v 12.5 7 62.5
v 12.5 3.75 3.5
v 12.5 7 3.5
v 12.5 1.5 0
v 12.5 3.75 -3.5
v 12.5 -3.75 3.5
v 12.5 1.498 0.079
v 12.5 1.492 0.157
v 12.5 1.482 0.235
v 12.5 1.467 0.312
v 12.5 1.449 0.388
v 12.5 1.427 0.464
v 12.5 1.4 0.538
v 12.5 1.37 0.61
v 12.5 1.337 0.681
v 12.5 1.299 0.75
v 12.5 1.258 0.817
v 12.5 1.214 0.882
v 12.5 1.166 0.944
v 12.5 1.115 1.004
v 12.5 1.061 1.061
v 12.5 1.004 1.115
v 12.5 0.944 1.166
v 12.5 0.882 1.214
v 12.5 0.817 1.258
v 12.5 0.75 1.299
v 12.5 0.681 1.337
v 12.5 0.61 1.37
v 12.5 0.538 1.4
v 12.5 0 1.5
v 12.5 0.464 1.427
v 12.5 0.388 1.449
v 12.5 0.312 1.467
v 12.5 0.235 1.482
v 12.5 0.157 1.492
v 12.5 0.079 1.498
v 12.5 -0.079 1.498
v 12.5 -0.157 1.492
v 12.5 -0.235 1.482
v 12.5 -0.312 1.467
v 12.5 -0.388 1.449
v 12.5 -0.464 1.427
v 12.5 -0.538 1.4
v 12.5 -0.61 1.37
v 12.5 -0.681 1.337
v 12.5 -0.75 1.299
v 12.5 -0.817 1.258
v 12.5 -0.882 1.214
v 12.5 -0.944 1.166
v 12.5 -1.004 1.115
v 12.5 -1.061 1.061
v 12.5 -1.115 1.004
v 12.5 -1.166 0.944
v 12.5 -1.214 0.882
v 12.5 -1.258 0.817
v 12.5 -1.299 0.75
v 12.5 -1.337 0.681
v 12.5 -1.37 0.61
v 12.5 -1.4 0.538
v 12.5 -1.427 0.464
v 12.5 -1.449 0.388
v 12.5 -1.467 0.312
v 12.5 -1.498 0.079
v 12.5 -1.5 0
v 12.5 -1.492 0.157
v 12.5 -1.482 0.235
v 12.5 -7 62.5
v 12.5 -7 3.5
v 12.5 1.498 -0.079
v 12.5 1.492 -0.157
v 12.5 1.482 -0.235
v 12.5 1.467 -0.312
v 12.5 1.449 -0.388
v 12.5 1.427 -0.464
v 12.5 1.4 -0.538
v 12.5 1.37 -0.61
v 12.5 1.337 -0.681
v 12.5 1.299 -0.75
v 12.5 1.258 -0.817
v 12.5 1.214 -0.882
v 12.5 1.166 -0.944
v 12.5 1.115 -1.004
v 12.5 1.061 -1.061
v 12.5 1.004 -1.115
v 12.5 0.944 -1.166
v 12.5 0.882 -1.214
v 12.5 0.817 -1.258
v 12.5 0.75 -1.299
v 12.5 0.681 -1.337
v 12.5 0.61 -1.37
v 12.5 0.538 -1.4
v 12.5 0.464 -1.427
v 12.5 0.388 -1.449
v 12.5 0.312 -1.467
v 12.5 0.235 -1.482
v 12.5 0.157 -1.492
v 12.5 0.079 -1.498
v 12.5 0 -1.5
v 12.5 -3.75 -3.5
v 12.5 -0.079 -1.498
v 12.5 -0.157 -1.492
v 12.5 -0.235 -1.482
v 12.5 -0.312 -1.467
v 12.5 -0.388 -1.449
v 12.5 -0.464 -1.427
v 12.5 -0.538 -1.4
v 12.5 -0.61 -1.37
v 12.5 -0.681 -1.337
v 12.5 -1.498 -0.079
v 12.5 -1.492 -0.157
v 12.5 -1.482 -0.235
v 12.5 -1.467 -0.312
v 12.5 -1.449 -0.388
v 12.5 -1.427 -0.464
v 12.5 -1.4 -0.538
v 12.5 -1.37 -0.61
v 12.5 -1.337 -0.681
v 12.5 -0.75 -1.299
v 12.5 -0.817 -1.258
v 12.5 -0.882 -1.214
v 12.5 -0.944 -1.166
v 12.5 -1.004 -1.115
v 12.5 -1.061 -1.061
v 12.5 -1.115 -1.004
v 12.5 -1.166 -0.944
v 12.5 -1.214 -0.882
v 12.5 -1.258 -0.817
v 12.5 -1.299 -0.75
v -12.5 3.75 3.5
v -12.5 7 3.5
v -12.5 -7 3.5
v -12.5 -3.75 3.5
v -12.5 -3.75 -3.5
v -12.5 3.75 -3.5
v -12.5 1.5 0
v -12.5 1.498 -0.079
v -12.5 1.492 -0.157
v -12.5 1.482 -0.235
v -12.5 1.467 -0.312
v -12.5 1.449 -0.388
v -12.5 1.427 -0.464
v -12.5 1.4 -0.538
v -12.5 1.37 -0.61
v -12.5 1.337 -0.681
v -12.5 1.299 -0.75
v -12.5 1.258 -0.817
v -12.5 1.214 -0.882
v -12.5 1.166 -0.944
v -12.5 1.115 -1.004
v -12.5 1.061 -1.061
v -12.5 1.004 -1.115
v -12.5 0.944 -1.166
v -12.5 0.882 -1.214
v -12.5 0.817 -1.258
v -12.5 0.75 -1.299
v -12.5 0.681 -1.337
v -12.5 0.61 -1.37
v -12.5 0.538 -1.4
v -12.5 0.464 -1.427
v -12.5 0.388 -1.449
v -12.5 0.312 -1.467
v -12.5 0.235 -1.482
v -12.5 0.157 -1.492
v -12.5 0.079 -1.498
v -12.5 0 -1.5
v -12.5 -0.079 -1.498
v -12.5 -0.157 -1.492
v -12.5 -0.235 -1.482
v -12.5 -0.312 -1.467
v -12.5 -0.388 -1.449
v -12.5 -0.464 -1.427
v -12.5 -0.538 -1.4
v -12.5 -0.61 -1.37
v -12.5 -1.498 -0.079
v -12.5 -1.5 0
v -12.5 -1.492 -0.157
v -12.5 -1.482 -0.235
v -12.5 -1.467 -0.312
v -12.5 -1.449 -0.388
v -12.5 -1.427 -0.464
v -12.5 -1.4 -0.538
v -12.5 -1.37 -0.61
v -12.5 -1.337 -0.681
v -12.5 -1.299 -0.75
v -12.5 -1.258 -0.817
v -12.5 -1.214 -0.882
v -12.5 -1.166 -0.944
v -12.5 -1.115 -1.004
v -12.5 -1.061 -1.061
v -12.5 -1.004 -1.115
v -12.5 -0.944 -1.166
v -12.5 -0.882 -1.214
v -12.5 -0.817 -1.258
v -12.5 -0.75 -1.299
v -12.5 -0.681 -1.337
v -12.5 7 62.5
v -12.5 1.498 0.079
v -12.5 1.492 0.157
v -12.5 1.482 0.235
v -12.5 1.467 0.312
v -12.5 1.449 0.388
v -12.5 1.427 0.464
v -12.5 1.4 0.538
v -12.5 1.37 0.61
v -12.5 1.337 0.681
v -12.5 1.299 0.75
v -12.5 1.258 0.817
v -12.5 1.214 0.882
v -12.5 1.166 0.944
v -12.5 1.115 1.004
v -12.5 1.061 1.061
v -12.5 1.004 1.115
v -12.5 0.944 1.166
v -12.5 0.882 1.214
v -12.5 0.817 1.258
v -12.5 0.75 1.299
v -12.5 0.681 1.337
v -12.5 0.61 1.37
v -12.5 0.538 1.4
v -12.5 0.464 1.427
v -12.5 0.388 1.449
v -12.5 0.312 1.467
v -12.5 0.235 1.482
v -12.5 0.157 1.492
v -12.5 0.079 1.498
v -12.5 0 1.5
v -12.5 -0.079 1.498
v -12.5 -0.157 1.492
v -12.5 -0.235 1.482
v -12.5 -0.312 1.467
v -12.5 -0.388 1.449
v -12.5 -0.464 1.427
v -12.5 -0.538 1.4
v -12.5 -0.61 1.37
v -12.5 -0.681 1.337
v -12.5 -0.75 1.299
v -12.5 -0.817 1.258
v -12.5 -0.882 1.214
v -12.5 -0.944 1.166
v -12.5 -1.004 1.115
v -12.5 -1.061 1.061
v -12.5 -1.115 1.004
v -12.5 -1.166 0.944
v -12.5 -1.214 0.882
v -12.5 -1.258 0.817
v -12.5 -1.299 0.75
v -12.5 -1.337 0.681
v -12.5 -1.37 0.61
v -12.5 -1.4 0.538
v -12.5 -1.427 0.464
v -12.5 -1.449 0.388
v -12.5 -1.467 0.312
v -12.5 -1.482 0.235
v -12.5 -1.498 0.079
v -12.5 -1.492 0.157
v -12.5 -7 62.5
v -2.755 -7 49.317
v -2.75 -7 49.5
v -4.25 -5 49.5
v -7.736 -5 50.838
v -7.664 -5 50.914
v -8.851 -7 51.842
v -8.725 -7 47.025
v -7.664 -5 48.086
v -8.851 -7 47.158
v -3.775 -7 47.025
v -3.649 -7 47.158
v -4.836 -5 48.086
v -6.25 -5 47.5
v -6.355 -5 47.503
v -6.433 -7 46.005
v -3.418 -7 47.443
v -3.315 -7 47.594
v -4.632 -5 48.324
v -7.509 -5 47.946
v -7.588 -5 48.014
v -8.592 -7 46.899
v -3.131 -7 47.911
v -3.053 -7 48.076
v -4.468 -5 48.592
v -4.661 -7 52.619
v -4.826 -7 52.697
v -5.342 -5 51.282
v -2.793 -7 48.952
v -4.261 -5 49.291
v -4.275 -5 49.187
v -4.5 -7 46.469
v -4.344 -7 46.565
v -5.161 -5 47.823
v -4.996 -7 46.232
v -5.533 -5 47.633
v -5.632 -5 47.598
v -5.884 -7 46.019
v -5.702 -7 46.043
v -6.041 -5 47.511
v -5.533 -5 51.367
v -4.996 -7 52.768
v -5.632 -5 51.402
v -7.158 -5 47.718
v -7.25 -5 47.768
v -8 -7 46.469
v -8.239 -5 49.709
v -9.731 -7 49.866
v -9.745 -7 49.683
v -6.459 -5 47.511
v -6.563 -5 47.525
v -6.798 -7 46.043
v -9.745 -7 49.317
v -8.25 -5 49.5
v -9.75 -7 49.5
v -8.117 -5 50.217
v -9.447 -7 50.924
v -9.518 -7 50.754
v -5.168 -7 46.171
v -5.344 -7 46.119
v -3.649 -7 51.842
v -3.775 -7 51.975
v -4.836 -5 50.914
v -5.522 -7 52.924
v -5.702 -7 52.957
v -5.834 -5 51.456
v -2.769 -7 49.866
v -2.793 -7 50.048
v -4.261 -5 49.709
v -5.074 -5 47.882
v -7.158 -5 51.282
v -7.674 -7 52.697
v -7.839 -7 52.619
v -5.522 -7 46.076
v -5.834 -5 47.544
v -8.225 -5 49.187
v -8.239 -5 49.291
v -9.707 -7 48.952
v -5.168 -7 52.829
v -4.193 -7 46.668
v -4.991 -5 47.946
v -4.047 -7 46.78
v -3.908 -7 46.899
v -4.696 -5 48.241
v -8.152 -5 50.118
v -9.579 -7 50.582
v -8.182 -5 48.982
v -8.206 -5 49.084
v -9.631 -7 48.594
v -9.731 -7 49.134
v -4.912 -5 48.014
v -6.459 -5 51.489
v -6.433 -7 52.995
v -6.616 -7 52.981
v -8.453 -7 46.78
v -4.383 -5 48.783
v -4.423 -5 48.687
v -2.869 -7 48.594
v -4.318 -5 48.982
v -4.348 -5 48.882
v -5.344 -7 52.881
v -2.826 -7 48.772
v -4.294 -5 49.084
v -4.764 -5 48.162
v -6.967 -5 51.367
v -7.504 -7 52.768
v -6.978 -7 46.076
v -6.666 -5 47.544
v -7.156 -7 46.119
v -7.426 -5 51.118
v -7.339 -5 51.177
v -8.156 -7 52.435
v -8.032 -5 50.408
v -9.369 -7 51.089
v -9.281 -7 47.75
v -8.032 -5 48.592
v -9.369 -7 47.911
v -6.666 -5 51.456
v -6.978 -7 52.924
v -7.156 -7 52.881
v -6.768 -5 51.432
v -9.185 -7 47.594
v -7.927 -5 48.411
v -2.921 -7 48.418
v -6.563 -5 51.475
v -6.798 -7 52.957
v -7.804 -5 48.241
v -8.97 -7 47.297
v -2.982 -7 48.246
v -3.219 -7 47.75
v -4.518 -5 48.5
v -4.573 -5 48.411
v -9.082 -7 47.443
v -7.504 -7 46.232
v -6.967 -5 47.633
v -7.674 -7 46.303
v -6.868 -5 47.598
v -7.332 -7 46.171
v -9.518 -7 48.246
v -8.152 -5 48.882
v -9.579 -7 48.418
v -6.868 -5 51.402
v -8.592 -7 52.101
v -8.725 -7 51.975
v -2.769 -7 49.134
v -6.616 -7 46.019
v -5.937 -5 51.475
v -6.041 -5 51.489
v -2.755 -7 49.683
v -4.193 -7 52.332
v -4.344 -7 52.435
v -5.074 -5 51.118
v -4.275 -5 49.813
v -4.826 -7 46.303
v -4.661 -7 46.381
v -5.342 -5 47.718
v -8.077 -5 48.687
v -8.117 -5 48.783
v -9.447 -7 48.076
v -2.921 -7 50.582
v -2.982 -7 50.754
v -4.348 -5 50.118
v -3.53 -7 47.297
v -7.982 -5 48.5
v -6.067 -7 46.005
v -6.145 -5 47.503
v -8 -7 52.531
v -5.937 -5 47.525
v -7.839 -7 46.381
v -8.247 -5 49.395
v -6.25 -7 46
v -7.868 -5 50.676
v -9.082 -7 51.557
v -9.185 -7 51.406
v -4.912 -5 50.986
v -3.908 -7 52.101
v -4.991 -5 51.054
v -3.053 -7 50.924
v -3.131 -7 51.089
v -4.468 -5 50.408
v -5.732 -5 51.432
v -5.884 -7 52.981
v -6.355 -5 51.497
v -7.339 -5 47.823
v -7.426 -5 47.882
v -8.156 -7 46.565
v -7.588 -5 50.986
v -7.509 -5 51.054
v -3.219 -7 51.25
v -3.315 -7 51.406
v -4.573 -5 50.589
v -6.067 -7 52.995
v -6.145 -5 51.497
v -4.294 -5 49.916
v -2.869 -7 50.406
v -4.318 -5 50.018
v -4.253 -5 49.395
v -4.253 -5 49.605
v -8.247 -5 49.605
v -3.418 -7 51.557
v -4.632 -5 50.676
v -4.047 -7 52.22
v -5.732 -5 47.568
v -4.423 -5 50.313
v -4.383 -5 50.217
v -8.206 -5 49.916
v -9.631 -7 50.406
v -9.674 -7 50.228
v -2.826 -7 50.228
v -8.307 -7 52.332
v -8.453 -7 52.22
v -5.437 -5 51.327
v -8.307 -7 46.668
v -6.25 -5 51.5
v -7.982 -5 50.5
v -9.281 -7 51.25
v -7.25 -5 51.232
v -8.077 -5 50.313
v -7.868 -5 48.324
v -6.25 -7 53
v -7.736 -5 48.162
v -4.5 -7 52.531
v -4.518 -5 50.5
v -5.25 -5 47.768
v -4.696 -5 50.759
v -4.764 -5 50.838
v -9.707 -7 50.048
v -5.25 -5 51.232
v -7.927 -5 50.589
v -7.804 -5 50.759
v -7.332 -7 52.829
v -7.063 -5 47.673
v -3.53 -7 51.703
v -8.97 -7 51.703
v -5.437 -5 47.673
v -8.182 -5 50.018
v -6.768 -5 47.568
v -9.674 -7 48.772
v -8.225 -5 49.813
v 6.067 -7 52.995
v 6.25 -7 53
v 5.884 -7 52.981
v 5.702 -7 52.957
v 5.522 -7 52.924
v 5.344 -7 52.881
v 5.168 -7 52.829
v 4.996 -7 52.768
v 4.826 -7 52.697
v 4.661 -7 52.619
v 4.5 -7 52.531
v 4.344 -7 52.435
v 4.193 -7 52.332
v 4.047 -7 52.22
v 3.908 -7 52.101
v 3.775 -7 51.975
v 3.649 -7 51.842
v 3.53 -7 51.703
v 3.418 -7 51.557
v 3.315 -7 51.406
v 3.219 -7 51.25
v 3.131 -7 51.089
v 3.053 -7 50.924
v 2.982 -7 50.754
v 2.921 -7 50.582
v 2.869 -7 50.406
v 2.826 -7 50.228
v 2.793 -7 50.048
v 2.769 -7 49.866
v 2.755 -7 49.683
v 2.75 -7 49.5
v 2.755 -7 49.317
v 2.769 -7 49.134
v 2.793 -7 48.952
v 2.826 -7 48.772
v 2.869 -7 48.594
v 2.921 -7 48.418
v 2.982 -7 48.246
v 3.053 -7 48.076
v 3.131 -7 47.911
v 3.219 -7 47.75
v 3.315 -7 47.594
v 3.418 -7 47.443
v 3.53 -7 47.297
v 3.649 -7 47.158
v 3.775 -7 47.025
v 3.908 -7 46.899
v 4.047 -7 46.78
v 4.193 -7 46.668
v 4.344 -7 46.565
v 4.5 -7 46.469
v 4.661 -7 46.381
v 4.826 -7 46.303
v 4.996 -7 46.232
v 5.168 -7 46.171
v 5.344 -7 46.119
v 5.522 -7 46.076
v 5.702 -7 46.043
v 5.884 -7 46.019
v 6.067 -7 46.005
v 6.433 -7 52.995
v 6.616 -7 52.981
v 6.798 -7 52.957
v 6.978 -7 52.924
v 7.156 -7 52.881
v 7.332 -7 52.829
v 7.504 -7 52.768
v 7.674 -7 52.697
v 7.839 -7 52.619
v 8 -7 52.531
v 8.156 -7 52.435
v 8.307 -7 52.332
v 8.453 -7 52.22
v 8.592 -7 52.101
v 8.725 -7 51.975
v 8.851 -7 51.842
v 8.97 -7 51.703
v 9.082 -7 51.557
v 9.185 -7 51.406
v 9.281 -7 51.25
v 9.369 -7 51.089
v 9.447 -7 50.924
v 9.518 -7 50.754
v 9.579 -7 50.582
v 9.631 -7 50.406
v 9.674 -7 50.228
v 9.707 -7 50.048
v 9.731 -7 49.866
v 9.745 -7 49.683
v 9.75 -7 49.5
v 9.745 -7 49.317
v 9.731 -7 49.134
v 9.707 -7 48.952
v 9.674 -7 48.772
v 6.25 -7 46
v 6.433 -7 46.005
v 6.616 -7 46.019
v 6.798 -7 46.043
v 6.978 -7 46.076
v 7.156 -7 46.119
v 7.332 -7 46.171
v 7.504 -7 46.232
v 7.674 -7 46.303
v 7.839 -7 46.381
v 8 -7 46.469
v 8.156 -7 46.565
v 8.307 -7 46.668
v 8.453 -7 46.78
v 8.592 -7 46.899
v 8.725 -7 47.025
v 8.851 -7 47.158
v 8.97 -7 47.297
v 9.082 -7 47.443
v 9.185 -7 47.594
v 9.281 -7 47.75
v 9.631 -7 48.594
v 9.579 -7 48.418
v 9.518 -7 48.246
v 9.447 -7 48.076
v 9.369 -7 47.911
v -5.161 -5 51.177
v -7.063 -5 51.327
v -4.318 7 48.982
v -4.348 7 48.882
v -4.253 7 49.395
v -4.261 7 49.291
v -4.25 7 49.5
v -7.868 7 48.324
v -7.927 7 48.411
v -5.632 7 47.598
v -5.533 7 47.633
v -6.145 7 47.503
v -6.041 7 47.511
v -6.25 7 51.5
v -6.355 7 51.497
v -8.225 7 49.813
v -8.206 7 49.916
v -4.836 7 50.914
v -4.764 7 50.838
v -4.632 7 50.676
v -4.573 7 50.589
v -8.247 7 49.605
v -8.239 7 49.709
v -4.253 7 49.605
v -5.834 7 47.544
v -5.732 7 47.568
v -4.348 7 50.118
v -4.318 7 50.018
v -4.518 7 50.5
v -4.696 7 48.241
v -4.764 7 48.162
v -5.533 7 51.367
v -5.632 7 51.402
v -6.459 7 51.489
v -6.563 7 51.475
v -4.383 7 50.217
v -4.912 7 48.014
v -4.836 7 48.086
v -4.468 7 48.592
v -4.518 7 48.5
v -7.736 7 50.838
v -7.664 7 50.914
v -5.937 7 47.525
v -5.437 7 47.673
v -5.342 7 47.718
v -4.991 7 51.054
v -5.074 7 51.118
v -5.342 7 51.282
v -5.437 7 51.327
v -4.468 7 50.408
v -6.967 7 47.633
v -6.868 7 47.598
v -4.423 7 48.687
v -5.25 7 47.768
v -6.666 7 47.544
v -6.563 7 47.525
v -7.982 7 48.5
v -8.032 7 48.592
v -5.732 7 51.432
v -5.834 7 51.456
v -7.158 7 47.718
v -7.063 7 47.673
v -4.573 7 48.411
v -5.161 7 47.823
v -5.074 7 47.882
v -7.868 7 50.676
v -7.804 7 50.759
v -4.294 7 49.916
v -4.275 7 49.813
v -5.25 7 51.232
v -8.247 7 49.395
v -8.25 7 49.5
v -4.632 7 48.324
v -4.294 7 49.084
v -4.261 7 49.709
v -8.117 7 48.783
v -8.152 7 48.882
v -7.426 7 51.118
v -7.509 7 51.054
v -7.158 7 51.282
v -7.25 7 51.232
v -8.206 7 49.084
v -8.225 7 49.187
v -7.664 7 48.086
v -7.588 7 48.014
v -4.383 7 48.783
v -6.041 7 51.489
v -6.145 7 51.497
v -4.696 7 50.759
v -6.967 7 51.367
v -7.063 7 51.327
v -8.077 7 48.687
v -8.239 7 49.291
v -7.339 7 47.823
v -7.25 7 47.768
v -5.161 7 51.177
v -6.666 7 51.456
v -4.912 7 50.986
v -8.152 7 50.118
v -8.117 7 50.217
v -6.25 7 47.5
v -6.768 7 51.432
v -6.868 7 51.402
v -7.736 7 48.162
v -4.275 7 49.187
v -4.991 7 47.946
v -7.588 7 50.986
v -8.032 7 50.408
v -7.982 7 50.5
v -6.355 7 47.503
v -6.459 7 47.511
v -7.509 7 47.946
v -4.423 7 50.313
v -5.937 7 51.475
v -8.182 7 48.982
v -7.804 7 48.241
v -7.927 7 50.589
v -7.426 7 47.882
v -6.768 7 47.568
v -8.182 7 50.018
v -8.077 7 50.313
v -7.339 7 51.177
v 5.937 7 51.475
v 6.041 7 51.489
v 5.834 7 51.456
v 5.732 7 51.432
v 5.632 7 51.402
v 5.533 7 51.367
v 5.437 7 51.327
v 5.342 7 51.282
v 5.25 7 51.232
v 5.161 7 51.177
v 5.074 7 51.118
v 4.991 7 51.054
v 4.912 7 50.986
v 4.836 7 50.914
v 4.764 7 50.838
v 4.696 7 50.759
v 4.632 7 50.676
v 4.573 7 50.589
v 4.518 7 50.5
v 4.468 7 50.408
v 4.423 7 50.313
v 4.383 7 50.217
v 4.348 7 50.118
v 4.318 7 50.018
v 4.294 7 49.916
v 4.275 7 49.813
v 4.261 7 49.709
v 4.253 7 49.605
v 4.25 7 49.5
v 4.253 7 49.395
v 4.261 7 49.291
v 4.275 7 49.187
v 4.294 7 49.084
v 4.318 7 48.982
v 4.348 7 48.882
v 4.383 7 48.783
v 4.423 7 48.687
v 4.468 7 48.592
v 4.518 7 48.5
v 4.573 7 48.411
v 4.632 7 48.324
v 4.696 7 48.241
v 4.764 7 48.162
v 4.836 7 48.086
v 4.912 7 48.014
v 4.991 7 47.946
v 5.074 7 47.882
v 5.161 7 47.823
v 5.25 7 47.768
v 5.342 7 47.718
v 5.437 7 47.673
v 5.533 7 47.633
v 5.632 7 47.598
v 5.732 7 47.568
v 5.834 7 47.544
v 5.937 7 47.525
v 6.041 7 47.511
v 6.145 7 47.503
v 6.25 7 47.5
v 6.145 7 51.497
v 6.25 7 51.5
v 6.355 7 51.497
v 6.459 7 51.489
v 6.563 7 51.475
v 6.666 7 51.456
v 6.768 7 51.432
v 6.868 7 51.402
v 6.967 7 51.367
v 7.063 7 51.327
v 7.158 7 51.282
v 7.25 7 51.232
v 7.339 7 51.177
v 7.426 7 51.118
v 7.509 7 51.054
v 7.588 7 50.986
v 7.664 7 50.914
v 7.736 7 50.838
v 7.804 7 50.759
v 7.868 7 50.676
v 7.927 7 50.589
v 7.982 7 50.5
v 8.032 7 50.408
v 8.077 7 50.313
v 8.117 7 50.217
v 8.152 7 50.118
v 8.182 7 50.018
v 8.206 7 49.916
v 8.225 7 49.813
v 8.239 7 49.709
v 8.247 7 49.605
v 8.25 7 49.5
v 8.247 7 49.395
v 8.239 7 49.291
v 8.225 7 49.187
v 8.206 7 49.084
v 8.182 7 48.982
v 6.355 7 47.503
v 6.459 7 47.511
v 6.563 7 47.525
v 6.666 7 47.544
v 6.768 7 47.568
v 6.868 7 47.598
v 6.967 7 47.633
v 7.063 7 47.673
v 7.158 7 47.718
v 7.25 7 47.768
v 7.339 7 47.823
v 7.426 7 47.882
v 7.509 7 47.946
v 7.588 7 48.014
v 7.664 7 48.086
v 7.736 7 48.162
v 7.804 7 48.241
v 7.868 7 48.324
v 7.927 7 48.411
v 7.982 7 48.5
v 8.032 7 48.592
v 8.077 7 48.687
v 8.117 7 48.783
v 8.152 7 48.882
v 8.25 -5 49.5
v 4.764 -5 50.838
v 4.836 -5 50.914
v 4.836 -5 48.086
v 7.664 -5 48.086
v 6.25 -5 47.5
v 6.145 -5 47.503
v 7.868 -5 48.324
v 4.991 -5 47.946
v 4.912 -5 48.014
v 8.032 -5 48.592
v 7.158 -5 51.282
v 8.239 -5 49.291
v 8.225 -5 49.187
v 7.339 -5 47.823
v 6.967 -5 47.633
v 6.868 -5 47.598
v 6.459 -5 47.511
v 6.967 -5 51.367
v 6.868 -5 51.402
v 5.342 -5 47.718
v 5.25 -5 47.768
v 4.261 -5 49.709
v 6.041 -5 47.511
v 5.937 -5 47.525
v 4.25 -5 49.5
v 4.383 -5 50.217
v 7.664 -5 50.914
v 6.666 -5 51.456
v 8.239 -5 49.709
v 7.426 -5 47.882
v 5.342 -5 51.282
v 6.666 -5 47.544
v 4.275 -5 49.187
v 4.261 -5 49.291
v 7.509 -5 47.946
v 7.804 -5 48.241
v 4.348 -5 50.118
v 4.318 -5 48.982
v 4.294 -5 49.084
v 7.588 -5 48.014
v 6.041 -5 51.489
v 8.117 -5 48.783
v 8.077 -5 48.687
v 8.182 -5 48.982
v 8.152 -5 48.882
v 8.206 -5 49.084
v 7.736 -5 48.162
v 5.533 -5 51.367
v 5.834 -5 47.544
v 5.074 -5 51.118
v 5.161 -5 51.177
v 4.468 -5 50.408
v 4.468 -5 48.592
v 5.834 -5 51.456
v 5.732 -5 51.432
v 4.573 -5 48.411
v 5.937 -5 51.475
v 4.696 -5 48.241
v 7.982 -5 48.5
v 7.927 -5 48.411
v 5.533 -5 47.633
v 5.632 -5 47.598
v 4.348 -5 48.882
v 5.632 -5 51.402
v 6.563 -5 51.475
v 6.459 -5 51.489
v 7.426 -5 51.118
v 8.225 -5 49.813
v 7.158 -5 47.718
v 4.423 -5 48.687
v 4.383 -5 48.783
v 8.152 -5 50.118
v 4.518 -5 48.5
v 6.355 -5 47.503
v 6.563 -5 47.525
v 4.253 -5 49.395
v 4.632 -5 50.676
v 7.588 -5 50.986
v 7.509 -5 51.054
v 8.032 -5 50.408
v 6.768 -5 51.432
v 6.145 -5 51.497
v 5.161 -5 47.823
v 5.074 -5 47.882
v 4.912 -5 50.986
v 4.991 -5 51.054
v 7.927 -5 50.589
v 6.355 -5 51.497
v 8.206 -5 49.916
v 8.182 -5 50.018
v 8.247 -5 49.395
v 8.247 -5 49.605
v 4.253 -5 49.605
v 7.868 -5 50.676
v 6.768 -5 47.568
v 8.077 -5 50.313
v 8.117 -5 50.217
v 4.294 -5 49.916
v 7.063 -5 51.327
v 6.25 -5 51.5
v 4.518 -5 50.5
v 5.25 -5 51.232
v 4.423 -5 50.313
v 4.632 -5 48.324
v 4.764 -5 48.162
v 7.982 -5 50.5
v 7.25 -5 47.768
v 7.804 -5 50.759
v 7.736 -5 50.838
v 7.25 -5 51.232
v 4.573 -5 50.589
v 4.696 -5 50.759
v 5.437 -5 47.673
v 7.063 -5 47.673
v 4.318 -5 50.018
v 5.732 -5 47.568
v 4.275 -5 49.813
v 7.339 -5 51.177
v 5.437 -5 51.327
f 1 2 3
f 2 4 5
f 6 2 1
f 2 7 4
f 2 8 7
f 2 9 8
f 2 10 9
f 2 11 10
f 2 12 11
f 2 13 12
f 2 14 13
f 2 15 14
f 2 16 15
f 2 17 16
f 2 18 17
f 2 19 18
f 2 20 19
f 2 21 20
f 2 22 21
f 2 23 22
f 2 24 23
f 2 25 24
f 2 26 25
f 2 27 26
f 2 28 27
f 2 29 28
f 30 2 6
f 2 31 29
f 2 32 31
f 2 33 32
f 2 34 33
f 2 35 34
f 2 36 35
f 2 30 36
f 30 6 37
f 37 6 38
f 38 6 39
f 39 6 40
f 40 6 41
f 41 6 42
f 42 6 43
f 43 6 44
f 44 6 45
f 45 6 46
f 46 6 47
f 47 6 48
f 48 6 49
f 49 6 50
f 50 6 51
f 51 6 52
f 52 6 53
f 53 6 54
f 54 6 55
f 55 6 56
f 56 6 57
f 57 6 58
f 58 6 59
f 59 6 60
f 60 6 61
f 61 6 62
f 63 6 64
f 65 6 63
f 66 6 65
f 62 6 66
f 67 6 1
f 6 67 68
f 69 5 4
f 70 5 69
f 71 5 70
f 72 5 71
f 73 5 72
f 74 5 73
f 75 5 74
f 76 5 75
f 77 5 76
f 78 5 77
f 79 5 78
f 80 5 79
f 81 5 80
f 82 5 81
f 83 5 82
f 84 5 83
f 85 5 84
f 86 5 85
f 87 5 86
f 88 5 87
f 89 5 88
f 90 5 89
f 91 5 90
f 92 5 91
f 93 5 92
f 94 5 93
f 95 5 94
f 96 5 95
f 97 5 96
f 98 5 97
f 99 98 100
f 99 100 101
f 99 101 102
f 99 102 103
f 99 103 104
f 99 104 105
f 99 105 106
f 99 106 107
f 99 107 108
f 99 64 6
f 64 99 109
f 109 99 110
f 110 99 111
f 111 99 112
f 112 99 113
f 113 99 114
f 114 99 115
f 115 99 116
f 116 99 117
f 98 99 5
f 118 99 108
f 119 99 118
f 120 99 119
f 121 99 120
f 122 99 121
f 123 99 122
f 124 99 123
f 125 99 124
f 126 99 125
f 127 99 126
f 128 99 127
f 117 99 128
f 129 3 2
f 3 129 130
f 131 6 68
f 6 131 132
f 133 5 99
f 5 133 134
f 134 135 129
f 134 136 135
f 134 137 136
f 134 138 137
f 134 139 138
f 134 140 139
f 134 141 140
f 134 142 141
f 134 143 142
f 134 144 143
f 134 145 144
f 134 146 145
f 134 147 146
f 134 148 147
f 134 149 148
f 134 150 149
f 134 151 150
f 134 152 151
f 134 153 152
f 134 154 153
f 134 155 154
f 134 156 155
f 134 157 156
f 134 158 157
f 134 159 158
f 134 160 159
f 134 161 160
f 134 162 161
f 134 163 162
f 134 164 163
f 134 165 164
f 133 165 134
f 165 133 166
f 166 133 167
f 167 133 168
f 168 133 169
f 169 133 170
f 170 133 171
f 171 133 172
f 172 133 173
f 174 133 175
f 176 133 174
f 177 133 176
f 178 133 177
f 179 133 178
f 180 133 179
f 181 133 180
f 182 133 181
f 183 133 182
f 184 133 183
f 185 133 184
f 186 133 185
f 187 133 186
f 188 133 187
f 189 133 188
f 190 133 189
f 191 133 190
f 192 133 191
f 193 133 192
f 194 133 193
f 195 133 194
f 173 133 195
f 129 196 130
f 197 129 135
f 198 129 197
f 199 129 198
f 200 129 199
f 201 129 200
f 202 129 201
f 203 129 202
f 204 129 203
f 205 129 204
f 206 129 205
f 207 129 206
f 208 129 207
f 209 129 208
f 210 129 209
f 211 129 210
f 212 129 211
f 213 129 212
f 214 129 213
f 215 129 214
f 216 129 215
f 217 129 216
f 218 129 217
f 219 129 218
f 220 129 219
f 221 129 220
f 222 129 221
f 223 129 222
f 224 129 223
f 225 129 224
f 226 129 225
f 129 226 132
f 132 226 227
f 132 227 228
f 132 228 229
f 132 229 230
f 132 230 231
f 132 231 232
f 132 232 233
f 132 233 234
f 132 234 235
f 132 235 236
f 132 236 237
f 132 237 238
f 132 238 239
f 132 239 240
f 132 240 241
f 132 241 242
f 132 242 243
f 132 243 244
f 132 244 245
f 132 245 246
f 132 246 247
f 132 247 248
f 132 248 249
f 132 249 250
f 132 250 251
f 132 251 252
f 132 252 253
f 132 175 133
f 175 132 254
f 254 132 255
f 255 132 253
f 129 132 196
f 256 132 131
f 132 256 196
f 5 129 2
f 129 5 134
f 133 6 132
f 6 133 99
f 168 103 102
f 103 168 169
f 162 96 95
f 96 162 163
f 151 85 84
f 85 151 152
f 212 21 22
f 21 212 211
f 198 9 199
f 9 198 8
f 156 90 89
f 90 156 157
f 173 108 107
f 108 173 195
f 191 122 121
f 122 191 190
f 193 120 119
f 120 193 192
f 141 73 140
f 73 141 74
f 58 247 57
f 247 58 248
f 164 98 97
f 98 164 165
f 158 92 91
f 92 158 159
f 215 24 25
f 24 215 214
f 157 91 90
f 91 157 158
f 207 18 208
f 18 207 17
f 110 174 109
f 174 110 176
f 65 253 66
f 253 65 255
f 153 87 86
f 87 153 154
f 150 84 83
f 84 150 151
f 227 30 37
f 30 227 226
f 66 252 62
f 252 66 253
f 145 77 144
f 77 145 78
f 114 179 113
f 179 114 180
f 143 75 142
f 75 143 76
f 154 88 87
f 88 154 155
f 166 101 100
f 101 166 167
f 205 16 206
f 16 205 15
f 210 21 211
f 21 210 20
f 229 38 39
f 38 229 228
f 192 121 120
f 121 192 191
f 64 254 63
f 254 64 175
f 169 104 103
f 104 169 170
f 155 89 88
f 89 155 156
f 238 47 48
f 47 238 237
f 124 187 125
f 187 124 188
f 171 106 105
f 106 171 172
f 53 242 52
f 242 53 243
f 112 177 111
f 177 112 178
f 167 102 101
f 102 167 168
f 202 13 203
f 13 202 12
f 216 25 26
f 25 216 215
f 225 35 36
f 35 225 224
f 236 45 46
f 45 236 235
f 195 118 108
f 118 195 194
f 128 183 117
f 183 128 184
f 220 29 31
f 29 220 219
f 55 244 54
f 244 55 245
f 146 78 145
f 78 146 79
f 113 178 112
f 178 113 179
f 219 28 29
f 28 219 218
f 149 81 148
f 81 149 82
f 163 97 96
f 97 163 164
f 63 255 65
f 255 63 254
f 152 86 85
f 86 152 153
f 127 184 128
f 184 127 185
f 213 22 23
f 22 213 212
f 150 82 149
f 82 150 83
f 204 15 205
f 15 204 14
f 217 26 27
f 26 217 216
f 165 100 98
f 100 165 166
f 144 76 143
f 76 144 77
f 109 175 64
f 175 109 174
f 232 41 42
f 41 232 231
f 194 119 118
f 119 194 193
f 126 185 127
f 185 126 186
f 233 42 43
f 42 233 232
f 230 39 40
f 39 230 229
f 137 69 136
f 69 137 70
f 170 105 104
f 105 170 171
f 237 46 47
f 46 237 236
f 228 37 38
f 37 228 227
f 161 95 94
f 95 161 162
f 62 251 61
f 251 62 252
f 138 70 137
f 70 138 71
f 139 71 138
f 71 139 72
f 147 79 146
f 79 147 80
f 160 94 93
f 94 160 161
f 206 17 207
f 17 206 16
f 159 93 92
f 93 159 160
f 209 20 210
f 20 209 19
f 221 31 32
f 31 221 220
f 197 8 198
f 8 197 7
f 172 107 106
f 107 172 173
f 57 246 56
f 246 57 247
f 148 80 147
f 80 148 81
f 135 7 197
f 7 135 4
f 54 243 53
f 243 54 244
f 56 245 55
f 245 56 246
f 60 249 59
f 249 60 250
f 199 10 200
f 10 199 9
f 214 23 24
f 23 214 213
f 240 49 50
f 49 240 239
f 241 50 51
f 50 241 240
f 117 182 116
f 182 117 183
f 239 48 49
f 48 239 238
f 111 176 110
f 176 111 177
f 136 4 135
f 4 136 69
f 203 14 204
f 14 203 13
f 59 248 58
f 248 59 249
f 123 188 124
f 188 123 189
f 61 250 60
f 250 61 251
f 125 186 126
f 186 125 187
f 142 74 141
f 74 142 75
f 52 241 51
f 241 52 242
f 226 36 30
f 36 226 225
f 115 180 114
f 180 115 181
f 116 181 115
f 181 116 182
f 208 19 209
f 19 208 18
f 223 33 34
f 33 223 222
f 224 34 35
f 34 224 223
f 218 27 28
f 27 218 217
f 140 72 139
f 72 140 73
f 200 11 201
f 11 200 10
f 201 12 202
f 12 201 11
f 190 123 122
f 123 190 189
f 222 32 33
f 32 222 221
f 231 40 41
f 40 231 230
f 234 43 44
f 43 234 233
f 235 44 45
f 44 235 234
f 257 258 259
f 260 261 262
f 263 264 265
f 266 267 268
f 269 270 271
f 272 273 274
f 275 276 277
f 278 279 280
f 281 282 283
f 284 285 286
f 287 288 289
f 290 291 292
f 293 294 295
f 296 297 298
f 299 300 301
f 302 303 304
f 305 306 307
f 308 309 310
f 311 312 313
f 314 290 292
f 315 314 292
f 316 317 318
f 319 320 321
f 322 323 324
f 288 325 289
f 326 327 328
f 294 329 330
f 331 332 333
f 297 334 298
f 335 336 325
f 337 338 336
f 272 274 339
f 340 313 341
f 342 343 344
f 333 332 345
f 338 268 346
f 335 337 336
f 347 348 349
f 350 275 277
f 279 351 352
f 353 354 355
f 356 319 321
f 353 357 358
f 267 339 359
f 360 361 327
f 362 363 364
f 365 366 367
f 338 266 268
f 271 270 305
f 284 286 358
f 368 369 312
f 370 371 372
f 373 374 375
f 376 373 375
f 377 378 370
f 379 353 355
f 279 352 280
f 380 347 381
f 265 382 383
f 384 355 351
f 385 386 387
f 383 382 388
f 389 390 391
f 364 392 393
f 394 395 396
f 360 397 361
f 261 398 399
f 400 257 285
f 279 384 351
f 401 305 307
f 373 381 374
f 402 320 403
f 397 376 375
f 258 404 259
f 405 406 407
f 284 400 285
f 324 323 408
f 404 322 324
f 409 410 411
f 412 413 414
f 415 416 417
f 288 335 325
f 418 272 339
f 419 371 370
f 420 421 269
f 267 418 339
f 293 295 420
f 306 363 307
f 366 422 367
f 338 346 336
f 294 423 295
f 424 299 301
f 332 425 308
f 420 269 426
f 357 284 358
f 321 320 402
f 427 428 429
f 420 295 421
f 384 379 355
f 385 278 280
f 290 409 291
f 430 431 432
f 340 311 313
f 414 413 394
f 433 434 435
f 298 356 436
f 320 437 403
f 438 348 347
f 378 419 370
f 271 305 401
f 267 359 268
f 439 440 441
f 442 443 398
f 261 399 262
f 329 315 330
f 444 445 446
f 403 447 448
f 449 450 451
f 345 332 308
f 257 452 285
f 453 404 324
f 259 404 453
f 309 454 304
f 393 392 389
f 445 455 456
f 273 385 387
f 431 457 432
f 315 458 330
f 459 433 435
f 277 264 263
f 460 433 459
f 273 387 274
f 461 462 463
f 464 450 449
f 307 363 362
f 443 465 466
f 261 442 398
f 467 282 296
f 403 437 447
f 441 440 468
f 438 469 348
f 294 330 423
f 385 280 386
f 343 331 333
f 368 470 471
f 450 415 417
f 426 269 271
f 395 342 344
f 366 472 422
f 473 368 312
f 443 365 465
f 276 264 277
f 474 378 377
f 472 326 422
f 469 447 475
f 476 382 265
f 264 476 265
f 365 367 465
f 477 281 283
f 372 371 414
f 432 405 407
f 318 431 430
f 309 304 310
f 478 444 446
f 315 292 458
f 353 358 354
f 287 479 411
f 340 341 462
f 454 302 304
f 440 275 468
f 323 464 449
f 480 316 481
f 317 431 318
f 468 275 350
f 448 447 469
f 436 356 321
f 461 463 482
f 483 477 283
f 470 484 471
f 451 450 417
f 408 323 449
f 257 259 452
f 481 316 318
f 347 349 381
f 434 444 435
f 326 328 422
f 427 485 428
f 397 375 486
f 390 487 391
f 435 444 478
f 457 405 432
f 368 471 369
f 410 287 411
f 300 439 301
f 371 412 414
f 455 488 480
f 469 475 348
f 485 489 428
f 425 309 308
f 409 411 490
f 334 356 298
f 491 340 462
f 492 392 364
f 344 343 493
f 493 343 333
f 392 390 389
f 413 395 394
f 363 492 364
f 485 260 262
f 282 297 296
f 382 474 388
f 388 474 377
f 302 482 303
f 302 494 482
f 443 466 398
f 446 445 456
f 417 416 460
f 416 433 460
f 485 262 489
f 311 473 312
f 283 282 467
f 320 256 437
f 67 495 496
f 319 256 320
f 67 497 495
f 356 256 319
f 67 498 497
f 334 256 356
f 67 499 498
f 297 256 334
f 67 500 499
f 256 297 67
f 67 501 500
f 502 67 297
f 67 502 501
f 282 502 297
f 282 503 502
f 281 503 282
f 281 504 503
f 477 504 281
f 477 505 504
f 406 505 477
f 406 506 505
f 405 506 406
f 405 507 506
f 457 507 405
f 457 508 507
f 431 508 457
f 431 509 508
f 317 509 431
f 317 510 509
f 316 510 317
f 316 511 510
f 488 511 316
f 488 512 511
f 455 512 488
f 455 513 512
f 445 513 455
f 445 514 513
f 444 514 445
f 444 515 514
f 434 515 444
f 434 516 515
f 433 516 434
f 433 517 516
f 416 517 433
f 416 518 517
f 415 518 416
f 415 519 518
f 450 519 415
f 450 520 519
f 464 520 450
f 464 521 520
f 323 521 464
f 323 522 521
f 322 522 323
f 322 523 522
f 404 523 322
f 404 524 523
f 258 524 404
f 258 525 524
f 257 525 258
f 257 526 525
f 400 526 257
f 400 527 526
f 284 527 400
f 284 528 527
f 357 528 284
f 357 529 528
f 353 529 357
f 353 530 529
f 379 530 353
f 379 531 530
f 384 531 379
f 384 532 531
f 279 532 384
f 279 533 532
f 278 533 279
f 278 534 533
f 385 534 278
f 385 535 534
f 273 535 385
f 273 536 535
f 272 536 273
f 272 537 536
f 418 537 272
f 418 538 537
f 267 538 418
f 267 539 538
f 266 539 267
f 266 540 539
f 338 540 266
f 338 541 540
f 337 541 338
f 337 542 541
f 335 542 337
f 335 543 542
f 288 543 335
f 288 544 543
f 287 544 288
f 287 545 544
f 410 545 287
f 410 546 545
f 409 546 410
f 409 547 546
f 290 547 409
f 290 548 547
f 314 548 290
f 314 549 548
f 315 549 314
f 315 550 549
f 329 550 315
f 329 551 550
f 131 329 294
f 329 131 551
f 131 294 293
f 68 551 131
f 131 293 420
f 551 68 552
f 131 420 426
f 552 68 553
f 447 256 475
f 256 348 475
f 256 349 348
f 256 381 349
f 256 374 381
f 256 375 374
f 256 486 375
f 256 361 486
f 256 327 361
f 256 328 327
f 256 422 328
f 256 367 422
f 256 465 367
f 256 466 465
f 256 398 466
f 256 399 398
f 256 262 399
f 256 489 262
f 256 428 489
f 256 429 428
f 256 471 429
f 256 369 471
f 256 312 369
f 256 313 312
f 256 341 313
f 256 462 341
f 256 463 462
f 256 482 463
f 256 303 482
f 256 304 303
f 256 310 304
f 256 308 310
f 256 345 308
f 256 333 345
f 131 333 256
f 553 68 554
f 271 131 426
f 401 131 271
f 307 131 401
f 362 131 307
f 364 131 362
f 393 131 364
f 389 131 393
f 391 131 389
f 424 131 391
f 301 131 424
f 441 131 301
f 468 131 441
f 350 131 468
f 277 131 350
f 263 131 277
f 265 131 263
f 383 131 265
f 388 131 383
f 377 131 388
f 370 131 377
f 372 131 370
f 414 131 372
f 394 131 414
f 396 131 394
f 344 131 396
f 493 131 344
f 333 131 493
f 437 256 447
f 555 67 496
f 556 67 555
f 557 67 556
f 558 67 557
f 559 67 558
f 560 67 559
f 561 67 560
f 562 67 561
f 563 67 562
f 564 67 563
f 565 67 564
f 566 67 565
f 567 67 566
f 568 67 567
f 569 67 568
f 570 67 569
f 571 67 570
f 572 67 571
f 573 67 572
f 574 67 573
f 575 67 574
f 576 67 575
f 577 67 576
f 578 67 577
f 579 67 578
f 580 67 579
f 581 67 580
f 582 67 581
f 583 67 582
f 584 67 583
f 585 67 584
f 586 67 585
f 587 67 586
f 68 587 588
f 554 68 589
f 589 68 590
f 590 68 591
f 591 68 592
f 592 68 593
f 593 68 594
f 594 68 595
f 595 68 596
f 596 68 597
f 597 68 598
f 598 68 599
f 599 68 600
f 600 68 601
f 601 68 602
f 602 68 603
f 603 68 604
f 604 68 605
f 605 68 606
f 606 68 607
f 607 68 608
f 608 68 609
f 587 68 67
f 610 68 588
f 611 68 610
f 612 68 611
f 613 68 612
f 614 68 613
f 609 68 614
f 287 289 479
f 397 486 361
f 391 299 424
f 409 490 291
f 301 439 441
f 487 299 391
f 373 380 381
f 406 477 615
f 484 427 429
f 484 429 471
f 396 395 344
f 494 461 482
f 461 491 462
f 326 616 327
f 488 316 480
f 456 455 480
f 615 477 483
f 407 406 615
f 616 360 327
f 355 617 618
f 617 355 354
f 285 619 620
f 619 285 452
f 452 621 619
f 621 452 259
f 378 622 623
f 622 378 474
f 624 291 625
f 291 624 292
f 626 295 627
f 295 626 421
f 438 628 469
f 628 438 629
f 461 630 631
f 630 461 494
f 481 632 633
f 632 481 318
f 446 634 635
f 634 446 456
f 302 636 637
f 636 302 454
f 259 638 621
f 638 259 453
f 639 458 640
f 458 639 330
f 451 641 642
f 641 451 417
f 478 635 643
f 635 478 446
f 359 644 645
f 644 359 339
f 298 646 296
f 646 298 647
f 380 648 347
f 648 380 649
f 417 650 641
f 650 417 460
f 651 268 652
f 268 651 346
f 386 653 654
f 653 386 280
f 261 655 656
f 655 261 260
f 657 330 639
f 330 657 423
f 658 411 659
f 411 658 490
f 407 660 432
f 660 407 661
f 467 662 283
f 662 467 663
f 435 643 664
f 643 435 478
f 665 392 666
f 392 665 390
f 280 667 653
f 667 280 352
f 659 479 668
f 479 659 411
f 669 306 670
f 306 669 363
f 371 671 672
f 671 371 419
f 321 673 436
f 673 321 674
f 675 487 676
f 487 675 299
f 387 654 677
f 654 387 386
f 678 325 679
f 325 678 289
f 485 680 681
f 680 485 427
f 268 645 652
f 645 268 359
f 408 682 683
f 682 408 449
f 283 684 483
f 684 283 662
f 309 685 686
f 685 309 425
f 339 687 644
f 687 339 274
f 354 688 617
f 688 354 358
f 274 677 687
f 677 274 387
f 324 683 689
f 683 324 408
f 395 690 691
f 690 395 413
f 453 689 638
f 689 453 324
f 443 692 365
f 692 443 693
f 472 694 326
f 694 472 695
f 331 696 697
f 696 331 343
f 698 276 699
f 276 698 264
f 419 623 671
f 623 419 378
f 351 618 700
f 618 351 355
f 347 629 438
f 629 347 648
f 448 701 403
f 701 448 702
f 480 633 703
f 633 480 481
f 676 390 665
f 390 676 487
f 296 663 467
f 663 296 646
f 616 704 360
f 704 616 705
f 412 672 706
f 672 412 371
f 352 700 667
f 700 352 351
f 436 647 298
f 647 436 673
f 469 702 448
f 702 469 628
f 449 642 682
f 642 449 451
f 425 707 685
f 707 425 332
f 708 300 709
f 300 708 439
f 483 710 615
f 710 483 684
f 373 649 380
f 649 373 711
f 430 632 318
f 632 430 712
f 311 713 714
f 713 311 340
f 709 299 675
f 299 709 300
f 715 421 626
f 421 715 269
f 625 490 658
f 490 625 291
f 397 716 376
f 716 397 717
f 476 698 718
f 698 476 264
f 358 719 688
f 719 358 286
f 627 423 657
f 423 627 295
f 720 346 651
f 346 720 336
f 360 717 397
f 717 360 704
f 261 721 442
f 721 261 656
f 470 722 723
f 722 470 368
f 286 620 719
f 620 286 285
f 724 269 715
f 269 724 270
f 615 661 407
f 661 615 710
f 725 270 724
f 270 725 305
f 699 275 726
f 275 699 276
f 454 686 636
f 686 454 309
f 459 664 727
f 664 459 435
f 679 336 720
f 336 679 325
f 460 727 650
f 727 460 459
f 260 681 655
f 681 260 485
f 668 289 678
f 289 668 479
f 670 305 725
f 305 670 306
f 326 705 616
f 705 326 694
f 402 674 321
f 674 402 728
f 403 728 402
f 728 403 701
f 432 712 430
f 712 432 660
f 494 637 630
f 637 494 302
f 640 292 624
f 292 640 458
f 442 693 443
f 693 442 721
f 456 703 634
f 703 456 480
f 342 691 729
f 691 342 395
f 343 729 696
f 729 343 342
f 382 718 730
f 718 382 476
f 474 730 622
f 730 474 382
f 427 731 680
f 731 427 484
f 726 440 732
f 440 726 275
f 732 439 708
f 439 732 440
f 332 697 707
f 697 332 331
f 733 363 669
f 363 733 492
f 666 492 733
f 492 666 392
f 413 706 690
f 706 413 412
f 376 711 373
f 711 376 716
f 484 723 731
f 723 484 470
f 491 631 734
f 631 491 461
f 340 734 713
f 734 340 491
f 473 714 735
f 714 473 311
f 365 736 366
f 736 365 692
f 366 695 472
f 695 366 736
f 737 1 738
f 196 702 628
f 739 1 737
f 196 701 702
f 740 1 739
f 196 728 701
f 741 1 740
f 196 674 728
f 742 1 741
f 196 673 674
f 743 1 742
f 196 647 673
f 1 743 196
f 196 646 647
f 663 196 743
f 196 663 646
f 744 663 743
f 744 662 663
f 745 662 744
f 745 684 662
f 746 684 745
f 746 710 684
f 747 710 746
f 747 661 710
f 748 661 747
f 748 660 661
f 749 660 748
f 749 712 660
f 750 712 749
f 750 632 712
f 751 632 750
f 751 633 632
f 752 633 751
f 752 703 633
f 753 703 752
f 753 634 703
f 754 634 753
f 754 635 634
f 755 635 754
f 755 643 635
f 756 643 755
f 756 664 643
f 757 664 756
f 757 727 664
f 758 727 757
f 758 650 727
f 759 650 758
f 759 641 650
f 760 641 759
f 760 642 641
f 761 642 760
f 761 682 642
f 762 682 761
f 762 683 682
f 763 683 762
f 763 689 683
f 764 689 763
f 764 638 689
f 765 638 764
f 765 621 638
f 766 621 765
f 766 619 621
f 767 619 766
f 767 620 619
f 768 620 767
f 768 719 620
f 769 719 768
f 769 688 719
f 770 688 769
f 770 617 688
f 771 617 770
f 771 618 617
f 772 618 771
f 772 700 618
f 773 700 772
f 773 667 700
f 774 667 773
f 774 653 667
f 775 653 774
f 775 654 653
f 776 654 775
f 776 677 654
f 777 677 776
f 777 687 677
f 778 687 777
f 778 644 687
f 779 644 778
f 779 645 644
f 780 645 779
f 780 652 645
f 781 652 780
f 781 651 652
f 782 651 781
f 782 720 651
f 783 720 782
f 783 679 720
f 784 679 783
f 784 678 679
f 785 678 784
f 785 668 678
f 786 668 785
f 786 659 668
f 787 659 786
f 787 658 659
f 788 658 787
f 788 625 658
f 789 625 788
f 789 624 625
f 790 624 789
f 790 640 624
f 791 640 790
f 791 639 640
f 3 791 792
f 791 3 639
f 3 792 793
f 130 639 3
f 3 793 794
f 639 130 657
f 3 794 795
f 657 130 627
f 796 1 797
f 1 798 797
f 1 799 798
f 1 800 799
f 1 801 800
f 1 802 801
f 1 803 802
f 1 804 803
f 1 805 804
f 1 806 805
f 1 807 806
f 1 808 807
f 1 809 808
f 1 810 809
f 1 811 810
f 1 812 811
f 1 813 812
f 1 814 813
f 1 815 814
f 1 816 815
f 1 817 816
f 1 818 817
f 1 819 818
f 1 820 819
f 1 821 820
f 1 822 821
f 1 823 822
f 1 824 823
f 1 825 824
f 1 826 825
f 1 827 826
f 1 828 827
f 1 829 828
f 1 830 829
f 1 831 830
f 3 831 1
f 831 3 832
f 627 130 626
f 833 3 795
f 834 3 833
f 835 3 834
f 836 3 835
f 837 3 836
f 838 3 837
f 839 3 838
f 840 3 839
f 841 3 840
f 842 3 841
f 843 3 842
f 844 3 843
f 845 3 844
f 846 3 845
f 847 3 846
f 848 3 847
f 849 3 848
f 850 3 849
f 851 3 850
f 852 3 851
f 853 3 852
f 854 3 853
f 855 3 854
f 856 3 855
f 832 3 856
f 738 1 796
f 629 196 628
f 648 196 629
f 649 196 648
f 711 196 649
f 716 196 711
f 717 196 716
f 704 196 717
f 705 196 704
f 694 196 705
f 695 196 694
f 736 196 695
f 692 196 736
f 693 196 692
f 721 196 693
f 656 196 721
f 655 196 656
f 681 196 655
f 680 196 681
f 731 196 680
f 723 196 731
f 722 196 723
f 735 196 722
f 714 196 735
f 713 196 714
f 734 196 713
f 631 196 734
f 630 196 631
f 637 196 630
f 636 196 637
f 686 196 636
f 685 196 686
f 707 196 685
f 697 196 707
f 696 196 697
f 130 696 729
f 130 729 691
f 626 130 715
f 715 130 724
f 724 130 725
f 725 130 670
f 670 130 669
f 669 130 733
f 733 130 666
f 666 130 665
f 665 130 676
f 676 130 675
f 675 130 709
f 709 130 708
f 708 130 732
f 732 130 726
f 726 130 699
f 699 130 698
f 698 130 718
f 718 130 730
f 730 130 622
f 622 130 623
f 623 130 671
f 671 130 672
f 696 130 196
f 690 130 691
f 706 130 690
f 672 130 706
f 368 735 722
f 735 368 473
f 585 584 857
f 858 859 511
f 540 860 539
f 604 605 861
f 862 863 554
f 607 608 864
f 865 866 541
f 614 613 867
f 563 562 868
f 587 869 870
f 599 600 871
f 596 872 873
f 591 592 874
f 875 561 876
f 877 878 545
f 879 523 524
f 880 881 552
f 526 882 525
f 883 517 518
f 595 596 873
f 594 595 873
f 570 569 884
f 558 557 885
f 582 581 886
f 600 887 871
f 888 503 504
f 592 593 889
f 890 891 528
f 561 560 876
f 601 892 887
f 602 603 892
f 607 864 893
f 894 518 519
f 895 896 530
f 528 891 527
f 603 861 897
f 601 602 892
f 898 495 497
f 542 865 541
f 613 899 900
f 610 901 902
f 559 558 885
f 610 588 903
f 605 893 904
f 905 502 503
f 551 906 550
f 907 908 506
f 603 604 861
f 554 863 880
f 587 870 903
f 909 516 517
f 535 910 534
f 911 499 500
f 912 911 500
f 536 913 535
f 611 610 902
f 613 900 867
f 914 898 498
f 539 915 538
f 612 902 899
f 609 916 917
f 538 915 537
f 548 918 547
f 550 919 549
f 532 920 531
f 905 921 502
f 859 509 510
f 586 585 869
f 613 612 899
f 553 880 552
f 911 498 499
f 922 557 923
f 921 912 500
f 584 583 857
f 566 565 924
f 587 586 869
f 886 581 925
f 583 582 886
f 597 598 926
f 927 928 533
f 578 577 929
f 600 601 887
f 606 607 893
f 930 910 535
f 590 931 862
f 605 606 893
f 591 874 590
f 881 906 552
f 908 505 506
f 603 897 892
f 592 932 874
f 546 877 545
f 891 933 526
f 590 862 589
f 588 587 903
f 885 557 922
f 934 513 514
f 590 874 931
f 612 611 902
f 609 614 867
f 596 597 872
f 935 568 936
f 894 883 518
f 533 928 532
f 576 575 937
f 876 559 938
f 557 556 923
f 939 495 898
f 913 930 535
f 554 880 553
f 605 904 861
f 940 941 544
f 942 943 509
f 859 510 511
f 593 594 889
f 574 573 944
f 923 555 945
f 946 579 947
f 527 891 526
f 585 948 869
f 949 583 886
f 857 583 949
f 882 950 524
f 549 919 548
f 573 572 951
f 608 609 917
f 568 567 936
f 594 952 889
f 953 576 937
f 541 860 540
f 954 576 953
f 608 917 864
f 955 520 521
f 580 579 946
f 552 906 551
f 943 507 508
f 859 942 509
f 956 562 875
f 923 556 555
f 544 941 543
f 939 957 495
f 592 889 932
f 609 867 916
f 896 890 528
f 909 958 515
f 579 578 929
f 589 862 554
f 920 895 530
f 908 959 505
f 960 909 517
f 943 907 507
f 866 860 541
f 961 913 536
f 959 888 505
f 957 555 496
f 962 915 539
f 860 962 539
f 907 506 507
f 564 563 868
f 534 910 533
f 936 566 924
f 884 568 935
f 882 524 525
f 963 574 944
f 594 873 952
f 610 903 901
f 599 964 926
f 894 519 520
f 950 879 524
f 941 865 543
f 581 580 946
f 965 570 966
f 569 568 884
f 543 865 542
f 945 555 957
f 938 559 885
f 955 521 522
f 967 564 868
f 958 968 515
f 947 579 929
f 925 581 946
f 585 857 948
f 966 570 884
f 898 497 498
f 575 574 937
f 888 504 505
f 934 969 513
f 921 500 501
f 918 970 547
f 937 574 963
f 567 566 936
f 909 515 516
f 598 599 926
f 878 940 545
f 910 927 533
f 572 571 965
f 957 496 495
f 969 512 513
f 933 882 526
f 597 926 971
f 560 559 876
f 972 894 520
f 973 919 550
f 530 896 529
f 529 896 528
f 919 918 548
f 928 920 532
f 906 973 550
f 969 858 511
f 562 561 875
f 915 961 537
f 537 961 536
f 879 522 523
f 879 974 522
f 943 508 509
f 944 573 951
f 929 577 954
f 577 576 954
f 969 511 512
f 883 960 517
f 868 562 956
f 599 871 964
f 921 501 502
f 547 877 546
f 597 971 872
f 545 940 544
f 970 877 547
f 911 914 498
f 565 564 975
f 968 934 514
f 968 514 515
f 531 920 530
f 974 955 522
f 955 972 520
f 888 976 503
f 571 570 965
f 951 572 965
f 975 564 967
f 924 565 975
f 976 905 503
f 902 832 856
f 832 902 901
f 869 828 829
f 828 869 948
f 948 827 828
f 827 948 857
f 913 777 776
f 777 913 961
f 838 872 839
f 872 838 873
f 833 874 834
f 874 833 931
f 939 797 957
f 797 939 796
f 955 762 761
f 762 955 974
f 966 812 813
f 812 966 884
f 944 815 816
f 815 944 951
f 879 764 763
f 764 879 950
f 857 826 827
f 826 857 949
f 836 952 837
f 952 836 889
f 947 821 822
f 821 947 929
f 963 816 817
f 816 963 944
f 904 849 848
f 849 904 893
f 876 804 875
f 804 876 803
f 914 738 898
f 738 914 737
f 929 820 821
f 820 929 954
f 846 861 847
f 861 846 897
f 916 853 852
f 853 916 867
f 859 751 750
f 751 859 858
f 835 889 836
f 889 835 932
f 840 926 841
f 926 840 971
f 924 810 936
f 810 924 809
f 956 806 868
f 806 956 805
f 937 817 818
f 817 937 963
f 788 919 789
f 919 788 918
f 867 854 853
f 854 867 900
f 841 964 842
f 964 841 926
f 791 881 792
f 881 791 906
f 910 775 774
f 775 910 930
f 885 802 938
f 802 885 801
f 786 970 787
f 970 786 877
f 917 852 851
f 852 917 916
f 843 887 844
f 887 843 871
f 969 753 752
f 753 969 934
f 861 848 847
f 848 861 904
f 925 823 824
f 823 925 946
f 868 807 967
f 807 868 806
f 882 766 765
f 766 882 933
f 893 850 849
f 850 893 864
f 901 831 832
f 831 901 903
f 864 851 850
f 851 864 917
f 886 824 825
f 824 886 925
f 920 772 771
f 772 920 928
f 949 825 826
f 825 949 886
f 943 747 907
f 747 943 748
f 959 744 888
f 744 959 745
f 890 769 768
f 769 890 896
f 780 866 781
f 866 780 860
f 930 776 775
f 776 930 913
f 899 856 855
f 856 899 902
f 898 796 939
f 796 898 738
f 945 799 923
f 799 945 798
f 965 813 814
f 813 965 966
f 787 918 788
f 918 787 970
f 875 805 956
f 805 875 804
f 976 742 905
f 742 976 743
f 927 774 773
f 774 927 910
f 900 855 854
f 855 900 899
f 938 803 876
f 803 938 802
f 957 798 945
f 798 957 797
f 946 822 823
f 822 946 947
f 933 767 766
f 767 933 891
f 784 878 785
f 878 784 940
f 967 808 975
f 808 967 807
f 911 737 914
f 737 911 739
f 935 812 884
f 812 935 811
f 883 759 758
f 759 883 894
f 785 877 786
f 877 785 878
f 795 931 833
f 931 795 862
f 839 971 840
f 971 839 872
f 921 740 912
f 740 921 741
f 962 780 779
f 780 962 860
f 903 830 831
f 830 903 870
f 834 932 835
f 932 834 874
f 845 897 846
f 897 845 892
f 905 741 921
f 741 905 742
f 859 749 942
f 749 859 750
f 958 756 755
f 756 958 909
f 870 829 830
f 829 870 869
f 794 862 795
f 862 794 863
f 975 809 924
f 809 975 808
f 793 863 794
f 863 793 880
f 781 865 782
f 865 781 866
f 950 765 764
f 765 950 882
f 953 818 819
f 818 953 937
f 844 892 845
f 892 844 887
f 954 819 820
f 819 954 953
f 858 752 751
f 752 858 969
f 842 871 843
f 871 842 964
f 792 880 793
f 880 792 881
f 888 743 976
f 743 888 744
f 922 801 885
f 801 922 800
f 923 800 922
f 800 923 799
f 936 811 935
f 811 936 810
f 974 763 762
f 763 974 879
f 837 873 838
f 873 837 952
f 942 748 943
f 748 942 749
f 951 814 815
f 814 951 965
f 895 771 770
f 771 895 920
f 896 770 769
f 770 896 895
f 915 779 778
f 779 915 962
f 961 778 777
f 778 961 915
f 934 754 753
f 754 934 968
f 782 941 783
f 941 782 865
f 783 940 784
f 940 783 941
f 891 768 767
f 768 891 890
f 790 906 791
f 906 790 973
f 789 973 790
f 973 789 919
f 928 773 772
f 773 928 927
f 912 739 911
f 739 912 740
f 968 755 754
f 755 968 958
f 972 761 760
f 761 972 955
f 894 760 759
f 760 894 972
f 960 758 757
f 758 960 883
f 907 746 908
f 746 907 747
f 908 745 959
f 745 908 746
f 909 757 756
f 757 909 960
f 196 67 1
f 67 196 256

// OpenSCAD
$fn = 120;


module ScrewCut(h) {
    cylinder(h = 2, r1 = 3.5, r2 = 2, center=false);
    cylinder(h=h, d=4, center=false);
}

module Base(diameter, thickness) {

  
    difference(){
        cylinder(h=thickness, d=diameter);
        translate([-diameter/4, 0, 0]){
            ScrewCut(thickeness);
        }
        translate([diameter/4, 0, 0]){
            ScrewCut(thickness);
        }
    }
    
}

module Insert() {
    width = 25;
    depth = 7.5;
    height = 7;
    throughHoleDiameter = 3;
    difference() {
        cube([width, depth, height], center=true);
            rotate([0, 90, 0]){
                cylinder(h = width, d = throughHoleDiameter, center=true);
            }
    }
}

//Base(30, 5);
Insert();

//54mm
difference() {
    translate([-25/2, -14/2, 7/2]){
        //rotate([-45, 0, 0]){
            cube([25, 14, 40+19], center = false);
        //}
    }

    union(){
        translate([-25/4, -14/2, 19/2+40]){
            rotate([-90, 0, 0]){
                ScrewCut(h=14);
            }
        }

        translate([25/4, -14/2, 19/2+40]){
            rotate([-90, 0, 0]){
                ScrewCut(h=14);
            }
        }
    }
}
